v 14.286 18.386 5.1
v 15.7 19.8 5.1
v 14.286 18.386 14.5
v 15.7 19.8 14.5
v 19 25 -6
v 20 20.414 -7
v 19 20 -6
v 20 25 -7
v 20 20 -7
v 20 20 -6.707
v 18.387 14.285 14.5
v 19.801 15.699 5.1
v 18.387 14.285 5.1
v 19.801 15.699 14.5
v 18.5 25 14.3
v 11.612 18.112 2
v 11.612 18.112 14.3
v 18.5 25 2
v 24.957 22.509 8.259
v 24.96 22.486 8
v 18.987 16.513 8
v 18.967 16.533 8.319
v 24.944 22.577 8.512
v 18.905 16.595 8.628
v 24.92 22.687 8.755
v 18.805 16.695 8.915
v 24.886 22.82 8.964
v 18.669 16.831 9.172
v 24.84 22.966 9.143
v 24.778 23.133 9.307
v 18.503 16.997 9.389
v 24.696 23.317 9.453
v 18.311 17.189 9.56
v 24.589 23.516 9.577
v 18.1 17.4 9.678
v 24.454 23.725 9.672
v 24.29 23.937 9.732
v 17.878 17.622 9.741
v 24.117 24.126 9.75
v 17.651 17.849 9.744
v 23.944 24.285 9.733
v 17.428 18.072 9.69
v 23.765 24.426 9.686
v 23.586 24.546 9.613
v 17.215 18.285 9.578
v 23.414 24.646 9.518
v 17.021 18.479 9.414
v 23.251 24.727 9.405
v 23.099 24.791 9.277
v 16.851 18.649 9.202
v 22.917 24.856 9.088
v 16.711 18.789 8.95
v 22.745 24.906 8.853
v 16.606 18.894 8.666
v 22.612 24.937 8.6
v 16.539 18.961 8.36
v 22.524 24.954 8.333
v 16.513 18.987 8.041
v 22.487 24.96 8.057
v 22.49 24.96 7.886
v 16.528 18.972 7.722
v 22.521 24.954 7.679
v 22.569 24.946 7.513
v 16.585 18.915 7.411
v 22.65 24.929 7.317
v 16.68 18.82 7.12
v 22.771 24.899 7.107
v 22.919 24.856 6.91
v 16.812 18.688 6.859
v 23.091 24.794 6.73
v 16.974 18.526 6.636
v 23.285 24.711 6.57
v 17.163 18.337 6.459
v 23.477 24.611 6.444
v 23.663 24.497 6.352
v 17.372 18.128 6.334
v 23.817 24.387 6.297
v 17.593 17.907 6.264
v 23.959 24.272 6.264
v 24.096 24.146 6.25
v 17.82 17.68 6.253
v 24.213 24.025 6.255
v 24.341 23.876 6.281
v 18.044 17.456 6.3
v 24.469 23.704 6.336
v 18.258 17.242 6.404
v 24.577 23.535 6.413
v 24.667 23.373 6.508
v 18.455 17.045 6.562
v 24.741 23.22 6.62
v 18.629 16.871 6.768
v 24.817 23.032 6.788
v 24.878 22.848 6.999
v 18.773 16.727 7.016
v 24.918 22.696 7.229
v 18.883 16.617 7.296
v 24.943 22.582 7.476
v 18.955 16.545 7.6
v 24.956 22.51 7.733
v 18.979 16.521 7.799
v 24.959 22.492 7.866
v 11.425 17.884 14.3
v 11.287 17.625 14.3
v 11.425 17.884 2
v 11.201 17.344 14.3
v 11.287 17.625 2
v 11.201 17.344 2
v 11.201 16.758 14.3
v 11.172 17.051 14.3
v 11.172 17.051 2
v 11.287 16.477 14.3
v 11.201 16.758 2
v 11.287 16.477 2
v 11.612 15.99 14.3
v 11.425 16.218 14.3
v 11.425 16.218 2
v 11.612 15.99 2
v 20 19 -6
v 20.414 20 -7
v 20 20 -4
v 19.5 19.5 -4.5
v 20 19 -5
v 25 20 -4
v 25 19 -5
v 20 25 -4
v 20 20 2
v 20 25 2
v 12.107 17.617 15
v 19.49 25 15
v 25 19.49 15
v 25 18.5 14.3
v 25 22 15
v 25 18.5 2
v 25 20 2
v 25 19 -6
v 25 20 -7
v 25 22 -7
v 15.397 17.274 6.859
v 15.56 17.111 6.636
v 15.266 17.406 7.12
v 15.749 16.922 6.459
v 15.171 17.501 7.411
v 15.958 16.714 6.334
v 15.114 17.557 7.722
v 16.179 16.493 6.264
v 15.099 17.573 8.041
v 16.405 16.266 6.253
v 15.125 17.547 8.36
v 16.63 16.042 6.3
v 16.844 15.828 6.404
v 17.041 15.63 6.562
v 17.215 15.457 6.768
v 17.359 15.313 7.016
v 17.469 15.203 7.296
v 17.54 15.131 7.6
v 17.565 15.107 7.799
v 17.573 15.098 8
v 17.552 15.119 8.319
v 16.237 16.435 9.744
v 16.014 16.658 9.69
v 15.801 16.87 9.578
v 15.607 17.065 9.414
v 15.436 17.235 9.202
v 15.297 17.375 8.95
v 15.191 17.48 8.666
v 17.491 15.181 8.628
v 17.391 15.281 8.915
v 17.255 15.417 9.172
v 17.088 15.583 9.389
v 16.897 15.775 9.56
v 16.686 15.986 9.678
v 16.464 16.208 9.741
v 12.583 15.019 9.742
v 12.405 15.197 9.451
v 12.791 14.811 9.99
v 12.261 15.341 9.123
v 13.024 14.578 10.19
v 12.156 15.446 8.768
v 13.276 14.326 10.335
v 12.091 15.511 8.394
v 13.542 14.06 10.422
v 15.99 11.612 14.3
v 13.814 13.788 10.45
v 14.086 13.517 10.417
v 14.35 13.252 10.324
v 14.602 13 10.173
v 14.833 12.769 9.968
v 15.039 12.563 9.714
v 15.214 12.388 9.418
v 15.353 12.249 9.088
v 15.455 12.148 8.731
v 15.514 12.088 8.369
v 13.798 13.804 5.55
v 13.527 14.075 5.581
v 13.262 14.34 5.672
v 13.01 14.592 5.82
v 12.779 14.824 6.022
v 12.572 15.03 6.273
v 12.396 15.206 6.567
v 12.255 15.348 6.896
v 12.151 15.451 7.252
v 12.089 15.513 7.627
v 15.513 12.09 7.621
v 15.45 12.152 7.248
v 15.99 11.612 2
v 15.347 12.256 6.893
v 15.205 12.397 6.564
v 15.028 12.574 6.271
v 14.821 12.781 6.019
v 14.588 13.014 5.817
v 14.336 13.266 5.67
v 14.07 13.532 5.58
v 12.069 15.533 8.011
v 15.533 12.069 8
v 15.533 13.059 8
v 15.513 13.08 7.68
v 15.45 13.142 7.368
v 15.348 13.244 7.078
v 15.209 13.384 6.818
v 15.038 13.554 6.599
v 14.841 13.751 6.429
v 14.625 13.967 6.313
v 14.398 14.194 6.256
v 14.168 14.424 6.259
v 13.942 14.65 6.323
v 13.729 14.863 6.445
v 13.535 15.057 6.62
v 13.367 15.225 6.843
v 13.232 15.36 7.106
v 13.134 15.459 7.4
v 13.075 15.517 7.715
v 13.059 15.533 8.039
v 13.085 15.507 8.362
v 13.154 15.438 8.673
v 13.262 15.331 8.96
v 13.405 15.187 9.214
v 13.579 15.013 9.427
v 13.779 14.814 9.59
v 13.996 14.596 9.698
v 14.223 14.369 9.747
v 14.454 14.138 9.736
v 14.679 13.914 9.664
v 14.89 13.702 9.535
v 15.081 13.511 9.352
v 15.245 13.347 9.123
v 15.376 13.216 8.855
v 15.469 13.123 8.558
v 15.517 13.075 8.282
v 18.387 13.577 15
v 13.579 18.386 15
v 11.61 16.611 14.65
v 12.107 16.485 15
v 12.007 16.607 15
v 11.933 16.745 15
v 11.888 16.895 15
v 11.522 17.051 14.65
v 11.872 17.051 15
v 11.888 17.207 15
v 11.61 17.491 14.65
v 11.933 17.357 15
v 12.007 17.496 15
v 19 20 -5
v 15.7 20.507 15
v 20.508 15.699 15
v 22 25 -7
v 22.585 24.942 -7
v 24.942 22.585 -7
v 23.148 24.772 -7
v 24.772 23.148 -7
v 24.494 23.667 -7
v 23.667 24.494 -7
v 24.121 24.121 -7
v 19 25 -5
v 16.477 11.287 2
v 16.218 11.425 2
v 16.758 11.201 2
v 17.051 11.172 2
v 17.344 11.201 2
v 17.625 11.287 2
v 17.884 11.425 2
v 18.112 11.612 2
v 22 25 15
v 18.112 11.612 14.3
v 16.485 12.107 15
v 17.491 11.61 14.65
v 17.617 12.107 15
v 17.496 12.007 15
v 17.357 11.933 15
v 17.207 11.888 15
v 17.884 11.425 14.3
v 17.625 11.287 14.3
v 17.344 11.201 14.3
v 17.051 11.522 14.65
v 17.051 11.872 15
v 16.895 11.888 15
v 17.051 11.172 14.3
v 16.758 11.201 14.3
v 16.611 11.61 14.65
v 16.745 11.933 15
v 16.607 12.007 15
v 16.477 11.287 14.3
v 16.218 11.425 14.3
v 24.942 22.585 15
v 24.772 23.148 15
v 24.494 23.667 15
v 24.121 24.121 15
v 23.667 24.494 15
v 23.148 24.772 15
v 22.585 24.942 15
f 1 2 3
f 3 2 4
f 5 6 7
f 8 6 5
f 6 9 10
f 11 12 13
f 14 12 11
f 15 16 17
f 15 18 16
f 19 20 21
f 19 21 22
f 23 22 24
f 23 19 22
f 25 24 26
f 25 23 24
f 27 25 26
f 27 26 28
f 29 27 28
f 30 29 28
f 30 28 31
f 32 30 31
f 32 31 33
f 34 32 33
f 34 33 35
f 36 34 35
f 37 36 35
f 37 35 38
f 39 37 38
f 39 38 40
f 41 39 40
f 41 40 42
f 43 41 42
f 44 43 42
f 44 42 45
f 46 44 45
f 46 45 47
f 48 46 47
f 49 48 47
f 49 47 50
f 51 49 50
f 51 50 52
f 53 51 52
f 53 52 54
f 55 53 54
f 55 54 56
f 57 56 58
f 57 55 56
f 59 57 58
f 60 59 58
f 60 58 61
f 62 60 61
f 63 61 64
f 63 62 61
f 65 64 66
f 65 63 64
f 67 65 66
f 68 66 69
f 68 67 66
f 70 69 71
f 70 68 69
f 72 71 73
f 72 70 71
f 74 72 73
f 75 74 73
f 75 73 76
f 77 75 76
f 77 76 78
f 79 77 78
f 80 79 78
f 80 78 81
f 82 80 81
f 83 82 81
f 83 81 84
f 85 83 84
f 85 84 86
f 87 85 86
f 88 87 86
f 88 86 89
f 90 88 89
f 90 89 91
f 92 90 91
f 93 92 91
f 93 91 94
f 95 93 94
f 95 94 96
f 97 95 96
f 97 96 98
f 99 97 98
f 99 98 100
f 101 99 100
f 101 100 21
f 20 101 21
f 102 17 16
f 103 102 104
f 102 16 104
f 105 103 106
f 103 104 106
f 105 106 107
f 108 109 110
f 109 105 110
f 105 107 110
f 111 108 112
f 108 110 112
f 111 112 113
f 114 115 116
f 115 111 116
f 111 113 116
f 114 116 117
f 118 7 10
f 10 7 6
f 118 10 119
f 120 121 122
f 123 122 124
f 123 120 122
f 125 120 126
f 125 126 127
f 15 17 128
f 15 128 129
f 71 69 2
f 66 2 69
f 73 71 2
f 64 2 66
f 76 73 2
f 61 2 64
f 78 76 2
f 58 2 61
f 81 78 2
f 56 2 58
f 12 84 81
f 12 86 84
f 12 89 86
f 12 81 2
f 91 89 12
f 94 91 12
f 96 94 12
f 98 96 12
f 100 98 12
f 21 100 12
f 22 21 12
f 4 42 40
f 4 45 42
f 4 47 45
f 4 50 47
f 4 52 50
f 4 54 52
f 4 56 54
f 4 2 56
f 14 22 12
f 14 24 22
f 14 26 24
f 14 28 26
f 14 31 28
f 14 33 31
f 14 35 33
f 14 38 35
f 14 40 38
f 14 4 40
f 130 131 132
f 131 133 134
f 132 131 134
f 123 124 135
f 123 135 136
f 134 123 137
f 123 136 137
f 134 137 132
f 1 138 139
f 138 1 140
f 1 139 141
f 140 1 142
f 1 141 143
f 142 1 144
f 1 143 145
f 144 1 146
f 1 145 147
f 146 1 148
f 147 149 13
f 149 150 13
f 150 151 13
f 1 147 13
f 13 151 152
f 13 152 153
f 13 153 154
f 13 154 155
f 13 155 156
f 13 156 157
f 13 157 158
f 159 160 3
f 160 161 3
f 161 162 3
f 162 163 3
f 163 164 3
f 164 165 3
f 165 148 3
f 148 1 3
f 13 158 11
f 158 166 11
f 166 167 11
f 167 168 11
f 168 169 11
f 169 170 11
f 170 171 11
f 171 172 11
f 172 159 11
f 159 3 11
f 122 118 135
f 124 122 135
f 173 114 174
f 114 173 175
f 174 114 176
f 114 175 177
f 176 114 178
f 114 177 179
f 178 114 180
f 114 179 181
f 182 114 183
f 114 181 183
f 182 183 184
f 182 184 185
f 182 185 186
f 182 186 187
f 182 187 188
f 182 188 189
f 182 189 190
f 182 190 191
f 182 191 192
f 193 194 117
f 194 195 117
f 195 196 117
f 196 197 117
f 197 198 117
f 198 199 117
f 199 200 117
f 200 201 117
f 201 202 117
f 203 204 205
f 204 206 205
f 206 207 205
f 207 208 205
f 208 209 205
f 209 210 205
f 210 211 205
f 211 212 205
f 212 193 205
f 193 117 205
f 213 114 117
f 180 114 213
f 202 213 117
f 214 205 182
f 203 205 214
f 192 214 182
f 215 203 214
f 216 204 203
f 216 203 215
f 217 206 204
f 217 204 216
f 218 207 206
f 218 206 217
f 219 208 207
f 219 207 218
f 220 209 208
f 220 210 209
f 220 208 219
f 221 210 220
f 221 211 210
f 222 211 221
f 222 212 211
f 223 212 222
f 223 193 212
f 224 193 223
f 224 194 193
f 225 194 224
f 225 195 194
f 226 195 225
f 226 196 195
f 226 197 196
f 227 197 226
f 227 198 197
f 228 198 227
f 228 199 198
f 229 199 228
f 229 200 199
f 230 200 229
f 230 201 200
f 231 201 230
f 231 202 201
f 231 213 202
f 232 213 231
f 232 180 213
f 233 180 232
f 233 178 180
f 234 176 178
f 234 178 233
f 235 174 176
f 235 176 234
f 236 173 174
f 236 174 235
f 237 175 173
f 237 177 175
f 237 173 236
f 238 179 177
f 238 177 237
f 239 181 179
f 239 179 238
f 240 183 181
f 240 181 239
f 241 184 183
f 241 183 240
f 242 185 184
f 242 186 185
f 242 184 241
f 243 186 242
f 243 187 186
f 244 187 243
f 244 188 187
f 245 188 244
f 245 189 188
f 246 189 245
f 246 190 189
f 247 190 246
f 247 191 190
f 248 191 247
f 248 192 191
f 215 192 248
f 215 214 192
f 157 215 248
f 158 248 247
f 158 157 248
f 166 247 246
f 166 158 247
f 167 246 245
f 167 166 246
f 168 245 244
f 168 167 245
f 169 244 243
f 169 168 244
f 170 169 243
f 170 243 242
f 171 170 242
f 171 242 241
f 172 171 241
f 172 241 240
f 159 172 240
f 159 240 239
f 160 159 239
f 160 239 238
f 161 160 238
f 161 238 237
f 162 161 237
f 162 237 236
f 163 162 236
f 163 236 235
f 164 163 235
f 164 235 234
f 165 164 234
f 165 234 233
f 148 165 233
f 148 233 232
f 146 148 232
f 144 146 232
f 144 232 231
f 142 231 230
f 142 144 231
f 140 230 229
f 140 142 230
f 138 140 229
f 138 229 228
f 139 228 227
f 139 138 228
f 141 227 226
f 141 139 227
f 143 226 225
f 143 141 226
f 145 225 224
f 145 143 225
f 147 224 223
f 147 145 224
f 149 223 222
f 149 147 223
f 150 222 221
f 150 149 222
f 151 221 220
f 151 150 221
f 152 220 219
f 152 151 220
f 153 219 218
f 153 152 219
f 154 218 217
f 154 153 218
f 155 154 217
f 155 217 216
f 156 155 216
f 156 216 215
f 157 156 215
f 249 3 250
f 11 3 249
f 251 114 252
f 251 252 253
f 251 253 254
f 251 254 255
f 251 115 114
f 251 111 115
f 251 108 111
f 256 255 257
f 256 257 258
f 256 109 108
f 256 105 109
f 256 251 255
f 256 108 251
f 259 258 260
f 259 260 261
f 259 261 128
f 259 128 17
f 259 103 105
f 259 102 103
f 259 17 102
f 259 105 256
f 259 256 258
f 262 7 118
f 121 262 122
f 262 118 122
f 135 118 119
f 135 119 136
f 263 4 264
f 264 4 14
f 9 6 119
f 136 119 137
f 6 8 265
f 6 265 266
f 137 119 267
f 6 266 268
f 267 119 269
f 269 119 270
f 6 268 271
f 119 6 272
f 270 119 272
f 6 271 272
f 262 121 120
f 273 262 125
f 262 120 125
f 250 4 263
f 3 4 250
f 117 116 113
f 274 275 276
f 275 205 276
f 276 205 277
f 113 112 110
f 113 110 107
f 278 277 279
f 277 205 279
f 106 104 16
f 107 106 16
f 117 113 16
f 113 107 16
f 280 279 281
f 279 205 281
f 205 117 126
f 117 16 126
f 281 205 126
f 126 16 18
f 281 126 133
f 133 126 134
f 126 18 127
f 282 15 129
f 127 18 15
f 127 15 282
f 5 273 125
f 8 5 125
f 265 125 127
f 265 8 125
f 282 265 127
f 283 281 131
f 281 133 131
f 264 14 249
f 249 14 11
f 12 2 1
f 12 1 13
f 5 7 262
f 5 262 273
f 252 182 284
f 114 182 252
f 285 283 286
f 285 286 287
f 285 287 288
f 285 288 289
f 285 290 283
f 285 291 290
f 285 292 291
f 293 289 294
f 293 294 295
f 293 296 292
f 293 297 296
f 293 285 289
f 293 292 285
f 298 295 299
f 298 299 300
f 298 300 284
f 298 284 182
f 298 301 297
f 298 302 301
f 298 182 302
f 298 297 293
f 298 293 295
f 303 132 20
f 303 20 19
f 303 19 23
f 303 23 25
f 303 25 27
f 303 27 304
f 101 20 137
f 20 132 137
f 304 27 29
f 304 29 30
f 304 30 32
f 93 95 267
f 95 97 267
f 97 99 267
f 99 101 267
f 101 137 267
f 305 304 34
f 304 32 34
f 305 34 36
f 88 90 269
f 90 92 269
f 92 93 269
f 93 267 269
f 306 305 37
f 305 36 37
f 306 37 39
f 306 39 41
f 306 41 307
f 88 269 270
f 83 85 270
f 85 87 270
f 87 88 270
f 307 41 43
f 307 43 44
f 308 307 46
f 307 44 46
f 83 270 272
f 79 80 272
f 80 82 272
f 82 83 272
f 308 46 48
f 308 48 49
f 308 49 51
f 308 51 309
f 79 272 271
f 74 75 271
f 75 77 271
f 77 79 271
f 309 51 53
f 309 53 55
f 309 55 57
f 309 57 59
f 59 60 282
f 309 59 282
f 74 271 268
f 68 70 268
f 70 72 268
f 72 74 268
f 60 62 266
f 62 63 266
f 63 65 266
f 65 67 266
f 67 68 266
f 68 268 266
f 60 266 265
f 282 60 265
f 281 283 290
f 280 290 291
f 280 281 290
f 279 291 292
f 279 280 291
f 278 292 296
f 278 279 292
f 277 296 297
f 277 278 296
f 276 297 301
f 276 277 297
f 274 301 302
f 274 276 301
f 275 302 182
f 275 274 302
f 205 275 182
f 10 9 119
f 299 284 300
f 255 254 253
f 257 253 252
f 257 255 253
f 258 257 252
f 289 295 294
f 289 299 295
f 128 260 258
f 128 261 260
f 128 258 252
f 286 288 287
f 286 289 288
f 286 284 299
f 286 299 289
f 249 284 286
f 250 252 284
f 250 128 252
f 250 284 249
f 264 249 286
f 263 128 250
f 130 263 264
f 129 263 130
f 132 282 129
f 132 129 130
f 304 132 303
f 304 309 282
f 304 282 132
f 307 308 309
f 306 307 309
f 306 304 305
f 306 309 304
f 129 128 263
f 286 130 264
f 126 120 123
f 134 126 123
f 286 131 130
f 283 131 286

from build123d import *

# Parameters (mm, degrees)
BOX406004_W                 = 5.8
BOX406004_H                 = 14.8
BOX406004_DEPTH             = 2
BOX406004_ROLL_ANGLE        = 89.999938
BOX406004_PITCH_ANGLE       = -2.6e-05
BOX406004_PLACEMENT_ANGLE   = -45.000013
CYLINDER066_R               = 1.75
CYLINDER066_DEPTH           = 33
CYLINDER066_ROLL_ANGLE      = 90.000024
CYLINDER066_PITCH_ANGLE     = 1e-05
CYLINDER066_PLACEMENT_ANGLE = -45.000049
BOX404_W                    = 5
BOX404_H                    = 5
BOX404_DEPTH                = 14
BOX406007_W                 = 14
BOX406007_H                 = 10
BOX406007_DEPTH             = 14
BOX406007_PLACEMENT_ANGLE   = 45
BOX405_W                    = 15
BOX405_H                    = 15
BOX405_DEPTH                = 13
CHAMFER_SIZE                = 8.5
FILLET_R                    = 1.5
BOX406008009_W              = 6
BOX406008009_H              = 6
BOX406008009_DEPTH          = 3
CHAMFER029_SIZE             = 1
CHAMFER030_SIZE             = 1
CHAMFER033_SIZE             = 1
FILLET006_R                 = 3
CHAMFER034_SIZE             = 0.7
CHAMFER042_SIZE             = 0.5


with BuildPart() as box406004:
    # Box406004 → Box406004 (new body)
    with BuildSketch(Plane.XY):
        with Locations((2.9, 7.4)):
            Rectangle(BOX406004_W, BOX406004_H)
    extrude(amount=BOX406004_DEPTH)


with BuildPart() as box406004_1:
    # Box406004 roll: moved
    add(box406004.part.rotate(Axis((0, 0, 0), (1, 0, 0)), BOX406004_ROLL_ANGLE))


with BuildPart() as box406004_2:
    # Box406004 pitch: moved
    add(box406004_1.part.rotate(Axis((0, 0, 0), (0, 1, 0)), BOX406004_PITCH_ANGLE))


with BuildPart() as box406004_3:
    # Box406004 placement: moved
    add(box406004_2.part.moved(Location((15.7, 19.8, 5.1))).rotate(Axis((15.7, 19.8, 5.1), (0, 0, 1)), BOX406004_PLACEMENT_ANGLE))


with BuildPart() as finger_cavity:
    # Cylinder066 → Cylinder066 (new body)
    with BuildSketch(Plane.XY):
        Circle(CYLINDER066_R)
    extrude(amount=CYLINDER066_DEPTH)


with BuildPart() as finger_cavity_1:
    # Cylinder066 roll: moved
    add(finger_cavity.part.rotate(Axis((0, 0, 0), (1, 0, 0)), CYLINDER066_ROLL_ANGLE))


with BuildPart() as finger_cavity_2:
    # Cylinder066 pitch: moved
    add(finger_cavity_1.part.rotate(Axis((0, 0, 0), (0, 1, 0)), CYLINDER066_PITCH_ANGLE))


with BuildPart() as finger_cavity_3:
    # Cylinder066 placement: moved
    add(finger_cavity_2.part.moved(Location((26.8701, 26.8701, 8))).rotate(Axis((26.8701, 26.8701, 8), (0, 0, 1)), CYLINDER066_PLACEMENT_ANGLE))

    # Fusion103077010: union Box406004
    add(box406004_3.part)


with BuildPart() as cube334:
    # Box404 → Box404 (new body)
    with BuildSketch(Plane(origin=(20, 20, -7), x_dir=(1, 0, 0), z_dir=(0, 0, 1))):
        with Locations((2.5, 2.5)):
            Rectangle(BOX404_W, BOX404_H)
    extrude(amount=BOX404_DEPTH)


with BuildPart() as cube338:
    # Box406007 → Box406007 (new body)
    with BuildSketch(Plane.XY):
        with Locations((7, 5)):
            Rectangle(BOX406007_W, BOX406007_H)
    extrude(amount=BOX406007_DEPTH)


with BuildPart() as cube338_1:
    # Box406007 placement: moved
    add(cube338.part.moved(Location((1.78, 11.68, 2))).rotate(Axis((1.78, 11.68, 2), (0, 0, -1)), BOX406007_PLACEMENT_ANGLE))


with BuildPart() as fillet_body:
    # Box405 → Box405 (new body)
    with BuildSketch(Plane(origin=(10, 10, 2), x_dir=(1, 0, 0), z_dir=(0, 0, 1))):
        with Locations((7.5, 7.5)):
            Rectangle(BOX405_W, BOX405_H)
    extrude(amount=BOX405_DEPTH)

    # Chamfer
    chamfer_edges = [fillet_body.edges().sort_by_distance(p)[0] for p in [
        (10, 25, 8.5),
        (25, 10, 8.5),
    ]]
    chamfer(chamfer_edges, length=CHAMFER_SIZE)

    # Cut173011017: cut Cube338
    add(cube338_1.part, mode=Mode.SUBTRACT)

    # Fillet
    fillet_edges = [fillet_body.edges().sort_by_distance(p)[0] for p in [
        (10.551068, 17.051068, 8.5),
        (17.051068, 10.551068, 8.5),
    ]]
    fillet(fillet_edges, radius=FILLET_R)


with BuildPart() as finger:
    # Box406008009 → Box406008009 (new body)
    with BuildSketch(Plane(origin=(19, 19, -7), x_dir=(1, 0, 0), z_dir=(0, 0, 1))):
        with Locations((3, 3)):
            Rectangle(BOX406008009_W, BOX406008009_H)
    extrude(amount=BOX406008009_DEPTH)

    # Chamfer029
    chamfer029_edges = [finger.edges().sort_by_distance(p)[0] for p in [
        (19, 22, -4),
        (22, 19, -4),
    ]]
    chamfer(chamfer029_edges, length=CHAMFER029_SIZE)

    # Chamfer030
    chamfer030_edges = [finger.edges().sort_by_distance(p)[0] for p in [
        (19, 19, -6),
    ]]
    chamfer(chamfer030_edges, length=CHAMFER030_SIZE)

    # Chamfer033
    chamfer033_edges = [finger.edges().sort_by_distance(p)[0] for p in [
        (19, 22.5, -7),
        (19.5, 19.5, -7),
        (22.5, 19, -7),
    ]]
    chamfer(chamfer033_edges, length=CHAMFER033_SIZE)

    # Fusion103077013004017007: union Cube334, Fillet body
    add(cube334.part)
    add(fillet_body.part)

    # Fillet006
    fillet006_edges = [finger.edges().sort_by_distance(p)[0] for p in [
        (25, 25, -5.5),
        (25, 25, -1),
        (25, 25, 4.5),
        (25, 25, 11),
    ]]
    fillet(fillet006_edges, radius=FILLET006_R)

    # Cut173011018: cut finger-cavity
    add(finger_cavity_3.part, mode=Mode.SUBTRACT)

    # Chamfer034
    chamfer034_edges = [finger.edges().sort_by_distance(p)[0] for p in [
        (17.051068, 11.172388, 15),
        (11.611728, 15.990408, 8.5),
        (13.801068, 13.801068, 15),
        (12.56362, 15.038516, 7.999993),
    ]]
    chamfer(chamfer034_edges, length=CHAMFER034_SIZE)

    # Chamfer042
    chamfer042_edges = [finger.edges().sort_by_distance(p)[0] for p in [
        (16.3364, 16.335187, 15),
        (19.094116, 14.991684, 15),
        (17.750614, 17.749401, 15),
        (14.992898, 19.092904, 15),
    ]]
    chamfer(chamfer042_edges, length=CHAMFER042_SIZE)


solid = finger.part
